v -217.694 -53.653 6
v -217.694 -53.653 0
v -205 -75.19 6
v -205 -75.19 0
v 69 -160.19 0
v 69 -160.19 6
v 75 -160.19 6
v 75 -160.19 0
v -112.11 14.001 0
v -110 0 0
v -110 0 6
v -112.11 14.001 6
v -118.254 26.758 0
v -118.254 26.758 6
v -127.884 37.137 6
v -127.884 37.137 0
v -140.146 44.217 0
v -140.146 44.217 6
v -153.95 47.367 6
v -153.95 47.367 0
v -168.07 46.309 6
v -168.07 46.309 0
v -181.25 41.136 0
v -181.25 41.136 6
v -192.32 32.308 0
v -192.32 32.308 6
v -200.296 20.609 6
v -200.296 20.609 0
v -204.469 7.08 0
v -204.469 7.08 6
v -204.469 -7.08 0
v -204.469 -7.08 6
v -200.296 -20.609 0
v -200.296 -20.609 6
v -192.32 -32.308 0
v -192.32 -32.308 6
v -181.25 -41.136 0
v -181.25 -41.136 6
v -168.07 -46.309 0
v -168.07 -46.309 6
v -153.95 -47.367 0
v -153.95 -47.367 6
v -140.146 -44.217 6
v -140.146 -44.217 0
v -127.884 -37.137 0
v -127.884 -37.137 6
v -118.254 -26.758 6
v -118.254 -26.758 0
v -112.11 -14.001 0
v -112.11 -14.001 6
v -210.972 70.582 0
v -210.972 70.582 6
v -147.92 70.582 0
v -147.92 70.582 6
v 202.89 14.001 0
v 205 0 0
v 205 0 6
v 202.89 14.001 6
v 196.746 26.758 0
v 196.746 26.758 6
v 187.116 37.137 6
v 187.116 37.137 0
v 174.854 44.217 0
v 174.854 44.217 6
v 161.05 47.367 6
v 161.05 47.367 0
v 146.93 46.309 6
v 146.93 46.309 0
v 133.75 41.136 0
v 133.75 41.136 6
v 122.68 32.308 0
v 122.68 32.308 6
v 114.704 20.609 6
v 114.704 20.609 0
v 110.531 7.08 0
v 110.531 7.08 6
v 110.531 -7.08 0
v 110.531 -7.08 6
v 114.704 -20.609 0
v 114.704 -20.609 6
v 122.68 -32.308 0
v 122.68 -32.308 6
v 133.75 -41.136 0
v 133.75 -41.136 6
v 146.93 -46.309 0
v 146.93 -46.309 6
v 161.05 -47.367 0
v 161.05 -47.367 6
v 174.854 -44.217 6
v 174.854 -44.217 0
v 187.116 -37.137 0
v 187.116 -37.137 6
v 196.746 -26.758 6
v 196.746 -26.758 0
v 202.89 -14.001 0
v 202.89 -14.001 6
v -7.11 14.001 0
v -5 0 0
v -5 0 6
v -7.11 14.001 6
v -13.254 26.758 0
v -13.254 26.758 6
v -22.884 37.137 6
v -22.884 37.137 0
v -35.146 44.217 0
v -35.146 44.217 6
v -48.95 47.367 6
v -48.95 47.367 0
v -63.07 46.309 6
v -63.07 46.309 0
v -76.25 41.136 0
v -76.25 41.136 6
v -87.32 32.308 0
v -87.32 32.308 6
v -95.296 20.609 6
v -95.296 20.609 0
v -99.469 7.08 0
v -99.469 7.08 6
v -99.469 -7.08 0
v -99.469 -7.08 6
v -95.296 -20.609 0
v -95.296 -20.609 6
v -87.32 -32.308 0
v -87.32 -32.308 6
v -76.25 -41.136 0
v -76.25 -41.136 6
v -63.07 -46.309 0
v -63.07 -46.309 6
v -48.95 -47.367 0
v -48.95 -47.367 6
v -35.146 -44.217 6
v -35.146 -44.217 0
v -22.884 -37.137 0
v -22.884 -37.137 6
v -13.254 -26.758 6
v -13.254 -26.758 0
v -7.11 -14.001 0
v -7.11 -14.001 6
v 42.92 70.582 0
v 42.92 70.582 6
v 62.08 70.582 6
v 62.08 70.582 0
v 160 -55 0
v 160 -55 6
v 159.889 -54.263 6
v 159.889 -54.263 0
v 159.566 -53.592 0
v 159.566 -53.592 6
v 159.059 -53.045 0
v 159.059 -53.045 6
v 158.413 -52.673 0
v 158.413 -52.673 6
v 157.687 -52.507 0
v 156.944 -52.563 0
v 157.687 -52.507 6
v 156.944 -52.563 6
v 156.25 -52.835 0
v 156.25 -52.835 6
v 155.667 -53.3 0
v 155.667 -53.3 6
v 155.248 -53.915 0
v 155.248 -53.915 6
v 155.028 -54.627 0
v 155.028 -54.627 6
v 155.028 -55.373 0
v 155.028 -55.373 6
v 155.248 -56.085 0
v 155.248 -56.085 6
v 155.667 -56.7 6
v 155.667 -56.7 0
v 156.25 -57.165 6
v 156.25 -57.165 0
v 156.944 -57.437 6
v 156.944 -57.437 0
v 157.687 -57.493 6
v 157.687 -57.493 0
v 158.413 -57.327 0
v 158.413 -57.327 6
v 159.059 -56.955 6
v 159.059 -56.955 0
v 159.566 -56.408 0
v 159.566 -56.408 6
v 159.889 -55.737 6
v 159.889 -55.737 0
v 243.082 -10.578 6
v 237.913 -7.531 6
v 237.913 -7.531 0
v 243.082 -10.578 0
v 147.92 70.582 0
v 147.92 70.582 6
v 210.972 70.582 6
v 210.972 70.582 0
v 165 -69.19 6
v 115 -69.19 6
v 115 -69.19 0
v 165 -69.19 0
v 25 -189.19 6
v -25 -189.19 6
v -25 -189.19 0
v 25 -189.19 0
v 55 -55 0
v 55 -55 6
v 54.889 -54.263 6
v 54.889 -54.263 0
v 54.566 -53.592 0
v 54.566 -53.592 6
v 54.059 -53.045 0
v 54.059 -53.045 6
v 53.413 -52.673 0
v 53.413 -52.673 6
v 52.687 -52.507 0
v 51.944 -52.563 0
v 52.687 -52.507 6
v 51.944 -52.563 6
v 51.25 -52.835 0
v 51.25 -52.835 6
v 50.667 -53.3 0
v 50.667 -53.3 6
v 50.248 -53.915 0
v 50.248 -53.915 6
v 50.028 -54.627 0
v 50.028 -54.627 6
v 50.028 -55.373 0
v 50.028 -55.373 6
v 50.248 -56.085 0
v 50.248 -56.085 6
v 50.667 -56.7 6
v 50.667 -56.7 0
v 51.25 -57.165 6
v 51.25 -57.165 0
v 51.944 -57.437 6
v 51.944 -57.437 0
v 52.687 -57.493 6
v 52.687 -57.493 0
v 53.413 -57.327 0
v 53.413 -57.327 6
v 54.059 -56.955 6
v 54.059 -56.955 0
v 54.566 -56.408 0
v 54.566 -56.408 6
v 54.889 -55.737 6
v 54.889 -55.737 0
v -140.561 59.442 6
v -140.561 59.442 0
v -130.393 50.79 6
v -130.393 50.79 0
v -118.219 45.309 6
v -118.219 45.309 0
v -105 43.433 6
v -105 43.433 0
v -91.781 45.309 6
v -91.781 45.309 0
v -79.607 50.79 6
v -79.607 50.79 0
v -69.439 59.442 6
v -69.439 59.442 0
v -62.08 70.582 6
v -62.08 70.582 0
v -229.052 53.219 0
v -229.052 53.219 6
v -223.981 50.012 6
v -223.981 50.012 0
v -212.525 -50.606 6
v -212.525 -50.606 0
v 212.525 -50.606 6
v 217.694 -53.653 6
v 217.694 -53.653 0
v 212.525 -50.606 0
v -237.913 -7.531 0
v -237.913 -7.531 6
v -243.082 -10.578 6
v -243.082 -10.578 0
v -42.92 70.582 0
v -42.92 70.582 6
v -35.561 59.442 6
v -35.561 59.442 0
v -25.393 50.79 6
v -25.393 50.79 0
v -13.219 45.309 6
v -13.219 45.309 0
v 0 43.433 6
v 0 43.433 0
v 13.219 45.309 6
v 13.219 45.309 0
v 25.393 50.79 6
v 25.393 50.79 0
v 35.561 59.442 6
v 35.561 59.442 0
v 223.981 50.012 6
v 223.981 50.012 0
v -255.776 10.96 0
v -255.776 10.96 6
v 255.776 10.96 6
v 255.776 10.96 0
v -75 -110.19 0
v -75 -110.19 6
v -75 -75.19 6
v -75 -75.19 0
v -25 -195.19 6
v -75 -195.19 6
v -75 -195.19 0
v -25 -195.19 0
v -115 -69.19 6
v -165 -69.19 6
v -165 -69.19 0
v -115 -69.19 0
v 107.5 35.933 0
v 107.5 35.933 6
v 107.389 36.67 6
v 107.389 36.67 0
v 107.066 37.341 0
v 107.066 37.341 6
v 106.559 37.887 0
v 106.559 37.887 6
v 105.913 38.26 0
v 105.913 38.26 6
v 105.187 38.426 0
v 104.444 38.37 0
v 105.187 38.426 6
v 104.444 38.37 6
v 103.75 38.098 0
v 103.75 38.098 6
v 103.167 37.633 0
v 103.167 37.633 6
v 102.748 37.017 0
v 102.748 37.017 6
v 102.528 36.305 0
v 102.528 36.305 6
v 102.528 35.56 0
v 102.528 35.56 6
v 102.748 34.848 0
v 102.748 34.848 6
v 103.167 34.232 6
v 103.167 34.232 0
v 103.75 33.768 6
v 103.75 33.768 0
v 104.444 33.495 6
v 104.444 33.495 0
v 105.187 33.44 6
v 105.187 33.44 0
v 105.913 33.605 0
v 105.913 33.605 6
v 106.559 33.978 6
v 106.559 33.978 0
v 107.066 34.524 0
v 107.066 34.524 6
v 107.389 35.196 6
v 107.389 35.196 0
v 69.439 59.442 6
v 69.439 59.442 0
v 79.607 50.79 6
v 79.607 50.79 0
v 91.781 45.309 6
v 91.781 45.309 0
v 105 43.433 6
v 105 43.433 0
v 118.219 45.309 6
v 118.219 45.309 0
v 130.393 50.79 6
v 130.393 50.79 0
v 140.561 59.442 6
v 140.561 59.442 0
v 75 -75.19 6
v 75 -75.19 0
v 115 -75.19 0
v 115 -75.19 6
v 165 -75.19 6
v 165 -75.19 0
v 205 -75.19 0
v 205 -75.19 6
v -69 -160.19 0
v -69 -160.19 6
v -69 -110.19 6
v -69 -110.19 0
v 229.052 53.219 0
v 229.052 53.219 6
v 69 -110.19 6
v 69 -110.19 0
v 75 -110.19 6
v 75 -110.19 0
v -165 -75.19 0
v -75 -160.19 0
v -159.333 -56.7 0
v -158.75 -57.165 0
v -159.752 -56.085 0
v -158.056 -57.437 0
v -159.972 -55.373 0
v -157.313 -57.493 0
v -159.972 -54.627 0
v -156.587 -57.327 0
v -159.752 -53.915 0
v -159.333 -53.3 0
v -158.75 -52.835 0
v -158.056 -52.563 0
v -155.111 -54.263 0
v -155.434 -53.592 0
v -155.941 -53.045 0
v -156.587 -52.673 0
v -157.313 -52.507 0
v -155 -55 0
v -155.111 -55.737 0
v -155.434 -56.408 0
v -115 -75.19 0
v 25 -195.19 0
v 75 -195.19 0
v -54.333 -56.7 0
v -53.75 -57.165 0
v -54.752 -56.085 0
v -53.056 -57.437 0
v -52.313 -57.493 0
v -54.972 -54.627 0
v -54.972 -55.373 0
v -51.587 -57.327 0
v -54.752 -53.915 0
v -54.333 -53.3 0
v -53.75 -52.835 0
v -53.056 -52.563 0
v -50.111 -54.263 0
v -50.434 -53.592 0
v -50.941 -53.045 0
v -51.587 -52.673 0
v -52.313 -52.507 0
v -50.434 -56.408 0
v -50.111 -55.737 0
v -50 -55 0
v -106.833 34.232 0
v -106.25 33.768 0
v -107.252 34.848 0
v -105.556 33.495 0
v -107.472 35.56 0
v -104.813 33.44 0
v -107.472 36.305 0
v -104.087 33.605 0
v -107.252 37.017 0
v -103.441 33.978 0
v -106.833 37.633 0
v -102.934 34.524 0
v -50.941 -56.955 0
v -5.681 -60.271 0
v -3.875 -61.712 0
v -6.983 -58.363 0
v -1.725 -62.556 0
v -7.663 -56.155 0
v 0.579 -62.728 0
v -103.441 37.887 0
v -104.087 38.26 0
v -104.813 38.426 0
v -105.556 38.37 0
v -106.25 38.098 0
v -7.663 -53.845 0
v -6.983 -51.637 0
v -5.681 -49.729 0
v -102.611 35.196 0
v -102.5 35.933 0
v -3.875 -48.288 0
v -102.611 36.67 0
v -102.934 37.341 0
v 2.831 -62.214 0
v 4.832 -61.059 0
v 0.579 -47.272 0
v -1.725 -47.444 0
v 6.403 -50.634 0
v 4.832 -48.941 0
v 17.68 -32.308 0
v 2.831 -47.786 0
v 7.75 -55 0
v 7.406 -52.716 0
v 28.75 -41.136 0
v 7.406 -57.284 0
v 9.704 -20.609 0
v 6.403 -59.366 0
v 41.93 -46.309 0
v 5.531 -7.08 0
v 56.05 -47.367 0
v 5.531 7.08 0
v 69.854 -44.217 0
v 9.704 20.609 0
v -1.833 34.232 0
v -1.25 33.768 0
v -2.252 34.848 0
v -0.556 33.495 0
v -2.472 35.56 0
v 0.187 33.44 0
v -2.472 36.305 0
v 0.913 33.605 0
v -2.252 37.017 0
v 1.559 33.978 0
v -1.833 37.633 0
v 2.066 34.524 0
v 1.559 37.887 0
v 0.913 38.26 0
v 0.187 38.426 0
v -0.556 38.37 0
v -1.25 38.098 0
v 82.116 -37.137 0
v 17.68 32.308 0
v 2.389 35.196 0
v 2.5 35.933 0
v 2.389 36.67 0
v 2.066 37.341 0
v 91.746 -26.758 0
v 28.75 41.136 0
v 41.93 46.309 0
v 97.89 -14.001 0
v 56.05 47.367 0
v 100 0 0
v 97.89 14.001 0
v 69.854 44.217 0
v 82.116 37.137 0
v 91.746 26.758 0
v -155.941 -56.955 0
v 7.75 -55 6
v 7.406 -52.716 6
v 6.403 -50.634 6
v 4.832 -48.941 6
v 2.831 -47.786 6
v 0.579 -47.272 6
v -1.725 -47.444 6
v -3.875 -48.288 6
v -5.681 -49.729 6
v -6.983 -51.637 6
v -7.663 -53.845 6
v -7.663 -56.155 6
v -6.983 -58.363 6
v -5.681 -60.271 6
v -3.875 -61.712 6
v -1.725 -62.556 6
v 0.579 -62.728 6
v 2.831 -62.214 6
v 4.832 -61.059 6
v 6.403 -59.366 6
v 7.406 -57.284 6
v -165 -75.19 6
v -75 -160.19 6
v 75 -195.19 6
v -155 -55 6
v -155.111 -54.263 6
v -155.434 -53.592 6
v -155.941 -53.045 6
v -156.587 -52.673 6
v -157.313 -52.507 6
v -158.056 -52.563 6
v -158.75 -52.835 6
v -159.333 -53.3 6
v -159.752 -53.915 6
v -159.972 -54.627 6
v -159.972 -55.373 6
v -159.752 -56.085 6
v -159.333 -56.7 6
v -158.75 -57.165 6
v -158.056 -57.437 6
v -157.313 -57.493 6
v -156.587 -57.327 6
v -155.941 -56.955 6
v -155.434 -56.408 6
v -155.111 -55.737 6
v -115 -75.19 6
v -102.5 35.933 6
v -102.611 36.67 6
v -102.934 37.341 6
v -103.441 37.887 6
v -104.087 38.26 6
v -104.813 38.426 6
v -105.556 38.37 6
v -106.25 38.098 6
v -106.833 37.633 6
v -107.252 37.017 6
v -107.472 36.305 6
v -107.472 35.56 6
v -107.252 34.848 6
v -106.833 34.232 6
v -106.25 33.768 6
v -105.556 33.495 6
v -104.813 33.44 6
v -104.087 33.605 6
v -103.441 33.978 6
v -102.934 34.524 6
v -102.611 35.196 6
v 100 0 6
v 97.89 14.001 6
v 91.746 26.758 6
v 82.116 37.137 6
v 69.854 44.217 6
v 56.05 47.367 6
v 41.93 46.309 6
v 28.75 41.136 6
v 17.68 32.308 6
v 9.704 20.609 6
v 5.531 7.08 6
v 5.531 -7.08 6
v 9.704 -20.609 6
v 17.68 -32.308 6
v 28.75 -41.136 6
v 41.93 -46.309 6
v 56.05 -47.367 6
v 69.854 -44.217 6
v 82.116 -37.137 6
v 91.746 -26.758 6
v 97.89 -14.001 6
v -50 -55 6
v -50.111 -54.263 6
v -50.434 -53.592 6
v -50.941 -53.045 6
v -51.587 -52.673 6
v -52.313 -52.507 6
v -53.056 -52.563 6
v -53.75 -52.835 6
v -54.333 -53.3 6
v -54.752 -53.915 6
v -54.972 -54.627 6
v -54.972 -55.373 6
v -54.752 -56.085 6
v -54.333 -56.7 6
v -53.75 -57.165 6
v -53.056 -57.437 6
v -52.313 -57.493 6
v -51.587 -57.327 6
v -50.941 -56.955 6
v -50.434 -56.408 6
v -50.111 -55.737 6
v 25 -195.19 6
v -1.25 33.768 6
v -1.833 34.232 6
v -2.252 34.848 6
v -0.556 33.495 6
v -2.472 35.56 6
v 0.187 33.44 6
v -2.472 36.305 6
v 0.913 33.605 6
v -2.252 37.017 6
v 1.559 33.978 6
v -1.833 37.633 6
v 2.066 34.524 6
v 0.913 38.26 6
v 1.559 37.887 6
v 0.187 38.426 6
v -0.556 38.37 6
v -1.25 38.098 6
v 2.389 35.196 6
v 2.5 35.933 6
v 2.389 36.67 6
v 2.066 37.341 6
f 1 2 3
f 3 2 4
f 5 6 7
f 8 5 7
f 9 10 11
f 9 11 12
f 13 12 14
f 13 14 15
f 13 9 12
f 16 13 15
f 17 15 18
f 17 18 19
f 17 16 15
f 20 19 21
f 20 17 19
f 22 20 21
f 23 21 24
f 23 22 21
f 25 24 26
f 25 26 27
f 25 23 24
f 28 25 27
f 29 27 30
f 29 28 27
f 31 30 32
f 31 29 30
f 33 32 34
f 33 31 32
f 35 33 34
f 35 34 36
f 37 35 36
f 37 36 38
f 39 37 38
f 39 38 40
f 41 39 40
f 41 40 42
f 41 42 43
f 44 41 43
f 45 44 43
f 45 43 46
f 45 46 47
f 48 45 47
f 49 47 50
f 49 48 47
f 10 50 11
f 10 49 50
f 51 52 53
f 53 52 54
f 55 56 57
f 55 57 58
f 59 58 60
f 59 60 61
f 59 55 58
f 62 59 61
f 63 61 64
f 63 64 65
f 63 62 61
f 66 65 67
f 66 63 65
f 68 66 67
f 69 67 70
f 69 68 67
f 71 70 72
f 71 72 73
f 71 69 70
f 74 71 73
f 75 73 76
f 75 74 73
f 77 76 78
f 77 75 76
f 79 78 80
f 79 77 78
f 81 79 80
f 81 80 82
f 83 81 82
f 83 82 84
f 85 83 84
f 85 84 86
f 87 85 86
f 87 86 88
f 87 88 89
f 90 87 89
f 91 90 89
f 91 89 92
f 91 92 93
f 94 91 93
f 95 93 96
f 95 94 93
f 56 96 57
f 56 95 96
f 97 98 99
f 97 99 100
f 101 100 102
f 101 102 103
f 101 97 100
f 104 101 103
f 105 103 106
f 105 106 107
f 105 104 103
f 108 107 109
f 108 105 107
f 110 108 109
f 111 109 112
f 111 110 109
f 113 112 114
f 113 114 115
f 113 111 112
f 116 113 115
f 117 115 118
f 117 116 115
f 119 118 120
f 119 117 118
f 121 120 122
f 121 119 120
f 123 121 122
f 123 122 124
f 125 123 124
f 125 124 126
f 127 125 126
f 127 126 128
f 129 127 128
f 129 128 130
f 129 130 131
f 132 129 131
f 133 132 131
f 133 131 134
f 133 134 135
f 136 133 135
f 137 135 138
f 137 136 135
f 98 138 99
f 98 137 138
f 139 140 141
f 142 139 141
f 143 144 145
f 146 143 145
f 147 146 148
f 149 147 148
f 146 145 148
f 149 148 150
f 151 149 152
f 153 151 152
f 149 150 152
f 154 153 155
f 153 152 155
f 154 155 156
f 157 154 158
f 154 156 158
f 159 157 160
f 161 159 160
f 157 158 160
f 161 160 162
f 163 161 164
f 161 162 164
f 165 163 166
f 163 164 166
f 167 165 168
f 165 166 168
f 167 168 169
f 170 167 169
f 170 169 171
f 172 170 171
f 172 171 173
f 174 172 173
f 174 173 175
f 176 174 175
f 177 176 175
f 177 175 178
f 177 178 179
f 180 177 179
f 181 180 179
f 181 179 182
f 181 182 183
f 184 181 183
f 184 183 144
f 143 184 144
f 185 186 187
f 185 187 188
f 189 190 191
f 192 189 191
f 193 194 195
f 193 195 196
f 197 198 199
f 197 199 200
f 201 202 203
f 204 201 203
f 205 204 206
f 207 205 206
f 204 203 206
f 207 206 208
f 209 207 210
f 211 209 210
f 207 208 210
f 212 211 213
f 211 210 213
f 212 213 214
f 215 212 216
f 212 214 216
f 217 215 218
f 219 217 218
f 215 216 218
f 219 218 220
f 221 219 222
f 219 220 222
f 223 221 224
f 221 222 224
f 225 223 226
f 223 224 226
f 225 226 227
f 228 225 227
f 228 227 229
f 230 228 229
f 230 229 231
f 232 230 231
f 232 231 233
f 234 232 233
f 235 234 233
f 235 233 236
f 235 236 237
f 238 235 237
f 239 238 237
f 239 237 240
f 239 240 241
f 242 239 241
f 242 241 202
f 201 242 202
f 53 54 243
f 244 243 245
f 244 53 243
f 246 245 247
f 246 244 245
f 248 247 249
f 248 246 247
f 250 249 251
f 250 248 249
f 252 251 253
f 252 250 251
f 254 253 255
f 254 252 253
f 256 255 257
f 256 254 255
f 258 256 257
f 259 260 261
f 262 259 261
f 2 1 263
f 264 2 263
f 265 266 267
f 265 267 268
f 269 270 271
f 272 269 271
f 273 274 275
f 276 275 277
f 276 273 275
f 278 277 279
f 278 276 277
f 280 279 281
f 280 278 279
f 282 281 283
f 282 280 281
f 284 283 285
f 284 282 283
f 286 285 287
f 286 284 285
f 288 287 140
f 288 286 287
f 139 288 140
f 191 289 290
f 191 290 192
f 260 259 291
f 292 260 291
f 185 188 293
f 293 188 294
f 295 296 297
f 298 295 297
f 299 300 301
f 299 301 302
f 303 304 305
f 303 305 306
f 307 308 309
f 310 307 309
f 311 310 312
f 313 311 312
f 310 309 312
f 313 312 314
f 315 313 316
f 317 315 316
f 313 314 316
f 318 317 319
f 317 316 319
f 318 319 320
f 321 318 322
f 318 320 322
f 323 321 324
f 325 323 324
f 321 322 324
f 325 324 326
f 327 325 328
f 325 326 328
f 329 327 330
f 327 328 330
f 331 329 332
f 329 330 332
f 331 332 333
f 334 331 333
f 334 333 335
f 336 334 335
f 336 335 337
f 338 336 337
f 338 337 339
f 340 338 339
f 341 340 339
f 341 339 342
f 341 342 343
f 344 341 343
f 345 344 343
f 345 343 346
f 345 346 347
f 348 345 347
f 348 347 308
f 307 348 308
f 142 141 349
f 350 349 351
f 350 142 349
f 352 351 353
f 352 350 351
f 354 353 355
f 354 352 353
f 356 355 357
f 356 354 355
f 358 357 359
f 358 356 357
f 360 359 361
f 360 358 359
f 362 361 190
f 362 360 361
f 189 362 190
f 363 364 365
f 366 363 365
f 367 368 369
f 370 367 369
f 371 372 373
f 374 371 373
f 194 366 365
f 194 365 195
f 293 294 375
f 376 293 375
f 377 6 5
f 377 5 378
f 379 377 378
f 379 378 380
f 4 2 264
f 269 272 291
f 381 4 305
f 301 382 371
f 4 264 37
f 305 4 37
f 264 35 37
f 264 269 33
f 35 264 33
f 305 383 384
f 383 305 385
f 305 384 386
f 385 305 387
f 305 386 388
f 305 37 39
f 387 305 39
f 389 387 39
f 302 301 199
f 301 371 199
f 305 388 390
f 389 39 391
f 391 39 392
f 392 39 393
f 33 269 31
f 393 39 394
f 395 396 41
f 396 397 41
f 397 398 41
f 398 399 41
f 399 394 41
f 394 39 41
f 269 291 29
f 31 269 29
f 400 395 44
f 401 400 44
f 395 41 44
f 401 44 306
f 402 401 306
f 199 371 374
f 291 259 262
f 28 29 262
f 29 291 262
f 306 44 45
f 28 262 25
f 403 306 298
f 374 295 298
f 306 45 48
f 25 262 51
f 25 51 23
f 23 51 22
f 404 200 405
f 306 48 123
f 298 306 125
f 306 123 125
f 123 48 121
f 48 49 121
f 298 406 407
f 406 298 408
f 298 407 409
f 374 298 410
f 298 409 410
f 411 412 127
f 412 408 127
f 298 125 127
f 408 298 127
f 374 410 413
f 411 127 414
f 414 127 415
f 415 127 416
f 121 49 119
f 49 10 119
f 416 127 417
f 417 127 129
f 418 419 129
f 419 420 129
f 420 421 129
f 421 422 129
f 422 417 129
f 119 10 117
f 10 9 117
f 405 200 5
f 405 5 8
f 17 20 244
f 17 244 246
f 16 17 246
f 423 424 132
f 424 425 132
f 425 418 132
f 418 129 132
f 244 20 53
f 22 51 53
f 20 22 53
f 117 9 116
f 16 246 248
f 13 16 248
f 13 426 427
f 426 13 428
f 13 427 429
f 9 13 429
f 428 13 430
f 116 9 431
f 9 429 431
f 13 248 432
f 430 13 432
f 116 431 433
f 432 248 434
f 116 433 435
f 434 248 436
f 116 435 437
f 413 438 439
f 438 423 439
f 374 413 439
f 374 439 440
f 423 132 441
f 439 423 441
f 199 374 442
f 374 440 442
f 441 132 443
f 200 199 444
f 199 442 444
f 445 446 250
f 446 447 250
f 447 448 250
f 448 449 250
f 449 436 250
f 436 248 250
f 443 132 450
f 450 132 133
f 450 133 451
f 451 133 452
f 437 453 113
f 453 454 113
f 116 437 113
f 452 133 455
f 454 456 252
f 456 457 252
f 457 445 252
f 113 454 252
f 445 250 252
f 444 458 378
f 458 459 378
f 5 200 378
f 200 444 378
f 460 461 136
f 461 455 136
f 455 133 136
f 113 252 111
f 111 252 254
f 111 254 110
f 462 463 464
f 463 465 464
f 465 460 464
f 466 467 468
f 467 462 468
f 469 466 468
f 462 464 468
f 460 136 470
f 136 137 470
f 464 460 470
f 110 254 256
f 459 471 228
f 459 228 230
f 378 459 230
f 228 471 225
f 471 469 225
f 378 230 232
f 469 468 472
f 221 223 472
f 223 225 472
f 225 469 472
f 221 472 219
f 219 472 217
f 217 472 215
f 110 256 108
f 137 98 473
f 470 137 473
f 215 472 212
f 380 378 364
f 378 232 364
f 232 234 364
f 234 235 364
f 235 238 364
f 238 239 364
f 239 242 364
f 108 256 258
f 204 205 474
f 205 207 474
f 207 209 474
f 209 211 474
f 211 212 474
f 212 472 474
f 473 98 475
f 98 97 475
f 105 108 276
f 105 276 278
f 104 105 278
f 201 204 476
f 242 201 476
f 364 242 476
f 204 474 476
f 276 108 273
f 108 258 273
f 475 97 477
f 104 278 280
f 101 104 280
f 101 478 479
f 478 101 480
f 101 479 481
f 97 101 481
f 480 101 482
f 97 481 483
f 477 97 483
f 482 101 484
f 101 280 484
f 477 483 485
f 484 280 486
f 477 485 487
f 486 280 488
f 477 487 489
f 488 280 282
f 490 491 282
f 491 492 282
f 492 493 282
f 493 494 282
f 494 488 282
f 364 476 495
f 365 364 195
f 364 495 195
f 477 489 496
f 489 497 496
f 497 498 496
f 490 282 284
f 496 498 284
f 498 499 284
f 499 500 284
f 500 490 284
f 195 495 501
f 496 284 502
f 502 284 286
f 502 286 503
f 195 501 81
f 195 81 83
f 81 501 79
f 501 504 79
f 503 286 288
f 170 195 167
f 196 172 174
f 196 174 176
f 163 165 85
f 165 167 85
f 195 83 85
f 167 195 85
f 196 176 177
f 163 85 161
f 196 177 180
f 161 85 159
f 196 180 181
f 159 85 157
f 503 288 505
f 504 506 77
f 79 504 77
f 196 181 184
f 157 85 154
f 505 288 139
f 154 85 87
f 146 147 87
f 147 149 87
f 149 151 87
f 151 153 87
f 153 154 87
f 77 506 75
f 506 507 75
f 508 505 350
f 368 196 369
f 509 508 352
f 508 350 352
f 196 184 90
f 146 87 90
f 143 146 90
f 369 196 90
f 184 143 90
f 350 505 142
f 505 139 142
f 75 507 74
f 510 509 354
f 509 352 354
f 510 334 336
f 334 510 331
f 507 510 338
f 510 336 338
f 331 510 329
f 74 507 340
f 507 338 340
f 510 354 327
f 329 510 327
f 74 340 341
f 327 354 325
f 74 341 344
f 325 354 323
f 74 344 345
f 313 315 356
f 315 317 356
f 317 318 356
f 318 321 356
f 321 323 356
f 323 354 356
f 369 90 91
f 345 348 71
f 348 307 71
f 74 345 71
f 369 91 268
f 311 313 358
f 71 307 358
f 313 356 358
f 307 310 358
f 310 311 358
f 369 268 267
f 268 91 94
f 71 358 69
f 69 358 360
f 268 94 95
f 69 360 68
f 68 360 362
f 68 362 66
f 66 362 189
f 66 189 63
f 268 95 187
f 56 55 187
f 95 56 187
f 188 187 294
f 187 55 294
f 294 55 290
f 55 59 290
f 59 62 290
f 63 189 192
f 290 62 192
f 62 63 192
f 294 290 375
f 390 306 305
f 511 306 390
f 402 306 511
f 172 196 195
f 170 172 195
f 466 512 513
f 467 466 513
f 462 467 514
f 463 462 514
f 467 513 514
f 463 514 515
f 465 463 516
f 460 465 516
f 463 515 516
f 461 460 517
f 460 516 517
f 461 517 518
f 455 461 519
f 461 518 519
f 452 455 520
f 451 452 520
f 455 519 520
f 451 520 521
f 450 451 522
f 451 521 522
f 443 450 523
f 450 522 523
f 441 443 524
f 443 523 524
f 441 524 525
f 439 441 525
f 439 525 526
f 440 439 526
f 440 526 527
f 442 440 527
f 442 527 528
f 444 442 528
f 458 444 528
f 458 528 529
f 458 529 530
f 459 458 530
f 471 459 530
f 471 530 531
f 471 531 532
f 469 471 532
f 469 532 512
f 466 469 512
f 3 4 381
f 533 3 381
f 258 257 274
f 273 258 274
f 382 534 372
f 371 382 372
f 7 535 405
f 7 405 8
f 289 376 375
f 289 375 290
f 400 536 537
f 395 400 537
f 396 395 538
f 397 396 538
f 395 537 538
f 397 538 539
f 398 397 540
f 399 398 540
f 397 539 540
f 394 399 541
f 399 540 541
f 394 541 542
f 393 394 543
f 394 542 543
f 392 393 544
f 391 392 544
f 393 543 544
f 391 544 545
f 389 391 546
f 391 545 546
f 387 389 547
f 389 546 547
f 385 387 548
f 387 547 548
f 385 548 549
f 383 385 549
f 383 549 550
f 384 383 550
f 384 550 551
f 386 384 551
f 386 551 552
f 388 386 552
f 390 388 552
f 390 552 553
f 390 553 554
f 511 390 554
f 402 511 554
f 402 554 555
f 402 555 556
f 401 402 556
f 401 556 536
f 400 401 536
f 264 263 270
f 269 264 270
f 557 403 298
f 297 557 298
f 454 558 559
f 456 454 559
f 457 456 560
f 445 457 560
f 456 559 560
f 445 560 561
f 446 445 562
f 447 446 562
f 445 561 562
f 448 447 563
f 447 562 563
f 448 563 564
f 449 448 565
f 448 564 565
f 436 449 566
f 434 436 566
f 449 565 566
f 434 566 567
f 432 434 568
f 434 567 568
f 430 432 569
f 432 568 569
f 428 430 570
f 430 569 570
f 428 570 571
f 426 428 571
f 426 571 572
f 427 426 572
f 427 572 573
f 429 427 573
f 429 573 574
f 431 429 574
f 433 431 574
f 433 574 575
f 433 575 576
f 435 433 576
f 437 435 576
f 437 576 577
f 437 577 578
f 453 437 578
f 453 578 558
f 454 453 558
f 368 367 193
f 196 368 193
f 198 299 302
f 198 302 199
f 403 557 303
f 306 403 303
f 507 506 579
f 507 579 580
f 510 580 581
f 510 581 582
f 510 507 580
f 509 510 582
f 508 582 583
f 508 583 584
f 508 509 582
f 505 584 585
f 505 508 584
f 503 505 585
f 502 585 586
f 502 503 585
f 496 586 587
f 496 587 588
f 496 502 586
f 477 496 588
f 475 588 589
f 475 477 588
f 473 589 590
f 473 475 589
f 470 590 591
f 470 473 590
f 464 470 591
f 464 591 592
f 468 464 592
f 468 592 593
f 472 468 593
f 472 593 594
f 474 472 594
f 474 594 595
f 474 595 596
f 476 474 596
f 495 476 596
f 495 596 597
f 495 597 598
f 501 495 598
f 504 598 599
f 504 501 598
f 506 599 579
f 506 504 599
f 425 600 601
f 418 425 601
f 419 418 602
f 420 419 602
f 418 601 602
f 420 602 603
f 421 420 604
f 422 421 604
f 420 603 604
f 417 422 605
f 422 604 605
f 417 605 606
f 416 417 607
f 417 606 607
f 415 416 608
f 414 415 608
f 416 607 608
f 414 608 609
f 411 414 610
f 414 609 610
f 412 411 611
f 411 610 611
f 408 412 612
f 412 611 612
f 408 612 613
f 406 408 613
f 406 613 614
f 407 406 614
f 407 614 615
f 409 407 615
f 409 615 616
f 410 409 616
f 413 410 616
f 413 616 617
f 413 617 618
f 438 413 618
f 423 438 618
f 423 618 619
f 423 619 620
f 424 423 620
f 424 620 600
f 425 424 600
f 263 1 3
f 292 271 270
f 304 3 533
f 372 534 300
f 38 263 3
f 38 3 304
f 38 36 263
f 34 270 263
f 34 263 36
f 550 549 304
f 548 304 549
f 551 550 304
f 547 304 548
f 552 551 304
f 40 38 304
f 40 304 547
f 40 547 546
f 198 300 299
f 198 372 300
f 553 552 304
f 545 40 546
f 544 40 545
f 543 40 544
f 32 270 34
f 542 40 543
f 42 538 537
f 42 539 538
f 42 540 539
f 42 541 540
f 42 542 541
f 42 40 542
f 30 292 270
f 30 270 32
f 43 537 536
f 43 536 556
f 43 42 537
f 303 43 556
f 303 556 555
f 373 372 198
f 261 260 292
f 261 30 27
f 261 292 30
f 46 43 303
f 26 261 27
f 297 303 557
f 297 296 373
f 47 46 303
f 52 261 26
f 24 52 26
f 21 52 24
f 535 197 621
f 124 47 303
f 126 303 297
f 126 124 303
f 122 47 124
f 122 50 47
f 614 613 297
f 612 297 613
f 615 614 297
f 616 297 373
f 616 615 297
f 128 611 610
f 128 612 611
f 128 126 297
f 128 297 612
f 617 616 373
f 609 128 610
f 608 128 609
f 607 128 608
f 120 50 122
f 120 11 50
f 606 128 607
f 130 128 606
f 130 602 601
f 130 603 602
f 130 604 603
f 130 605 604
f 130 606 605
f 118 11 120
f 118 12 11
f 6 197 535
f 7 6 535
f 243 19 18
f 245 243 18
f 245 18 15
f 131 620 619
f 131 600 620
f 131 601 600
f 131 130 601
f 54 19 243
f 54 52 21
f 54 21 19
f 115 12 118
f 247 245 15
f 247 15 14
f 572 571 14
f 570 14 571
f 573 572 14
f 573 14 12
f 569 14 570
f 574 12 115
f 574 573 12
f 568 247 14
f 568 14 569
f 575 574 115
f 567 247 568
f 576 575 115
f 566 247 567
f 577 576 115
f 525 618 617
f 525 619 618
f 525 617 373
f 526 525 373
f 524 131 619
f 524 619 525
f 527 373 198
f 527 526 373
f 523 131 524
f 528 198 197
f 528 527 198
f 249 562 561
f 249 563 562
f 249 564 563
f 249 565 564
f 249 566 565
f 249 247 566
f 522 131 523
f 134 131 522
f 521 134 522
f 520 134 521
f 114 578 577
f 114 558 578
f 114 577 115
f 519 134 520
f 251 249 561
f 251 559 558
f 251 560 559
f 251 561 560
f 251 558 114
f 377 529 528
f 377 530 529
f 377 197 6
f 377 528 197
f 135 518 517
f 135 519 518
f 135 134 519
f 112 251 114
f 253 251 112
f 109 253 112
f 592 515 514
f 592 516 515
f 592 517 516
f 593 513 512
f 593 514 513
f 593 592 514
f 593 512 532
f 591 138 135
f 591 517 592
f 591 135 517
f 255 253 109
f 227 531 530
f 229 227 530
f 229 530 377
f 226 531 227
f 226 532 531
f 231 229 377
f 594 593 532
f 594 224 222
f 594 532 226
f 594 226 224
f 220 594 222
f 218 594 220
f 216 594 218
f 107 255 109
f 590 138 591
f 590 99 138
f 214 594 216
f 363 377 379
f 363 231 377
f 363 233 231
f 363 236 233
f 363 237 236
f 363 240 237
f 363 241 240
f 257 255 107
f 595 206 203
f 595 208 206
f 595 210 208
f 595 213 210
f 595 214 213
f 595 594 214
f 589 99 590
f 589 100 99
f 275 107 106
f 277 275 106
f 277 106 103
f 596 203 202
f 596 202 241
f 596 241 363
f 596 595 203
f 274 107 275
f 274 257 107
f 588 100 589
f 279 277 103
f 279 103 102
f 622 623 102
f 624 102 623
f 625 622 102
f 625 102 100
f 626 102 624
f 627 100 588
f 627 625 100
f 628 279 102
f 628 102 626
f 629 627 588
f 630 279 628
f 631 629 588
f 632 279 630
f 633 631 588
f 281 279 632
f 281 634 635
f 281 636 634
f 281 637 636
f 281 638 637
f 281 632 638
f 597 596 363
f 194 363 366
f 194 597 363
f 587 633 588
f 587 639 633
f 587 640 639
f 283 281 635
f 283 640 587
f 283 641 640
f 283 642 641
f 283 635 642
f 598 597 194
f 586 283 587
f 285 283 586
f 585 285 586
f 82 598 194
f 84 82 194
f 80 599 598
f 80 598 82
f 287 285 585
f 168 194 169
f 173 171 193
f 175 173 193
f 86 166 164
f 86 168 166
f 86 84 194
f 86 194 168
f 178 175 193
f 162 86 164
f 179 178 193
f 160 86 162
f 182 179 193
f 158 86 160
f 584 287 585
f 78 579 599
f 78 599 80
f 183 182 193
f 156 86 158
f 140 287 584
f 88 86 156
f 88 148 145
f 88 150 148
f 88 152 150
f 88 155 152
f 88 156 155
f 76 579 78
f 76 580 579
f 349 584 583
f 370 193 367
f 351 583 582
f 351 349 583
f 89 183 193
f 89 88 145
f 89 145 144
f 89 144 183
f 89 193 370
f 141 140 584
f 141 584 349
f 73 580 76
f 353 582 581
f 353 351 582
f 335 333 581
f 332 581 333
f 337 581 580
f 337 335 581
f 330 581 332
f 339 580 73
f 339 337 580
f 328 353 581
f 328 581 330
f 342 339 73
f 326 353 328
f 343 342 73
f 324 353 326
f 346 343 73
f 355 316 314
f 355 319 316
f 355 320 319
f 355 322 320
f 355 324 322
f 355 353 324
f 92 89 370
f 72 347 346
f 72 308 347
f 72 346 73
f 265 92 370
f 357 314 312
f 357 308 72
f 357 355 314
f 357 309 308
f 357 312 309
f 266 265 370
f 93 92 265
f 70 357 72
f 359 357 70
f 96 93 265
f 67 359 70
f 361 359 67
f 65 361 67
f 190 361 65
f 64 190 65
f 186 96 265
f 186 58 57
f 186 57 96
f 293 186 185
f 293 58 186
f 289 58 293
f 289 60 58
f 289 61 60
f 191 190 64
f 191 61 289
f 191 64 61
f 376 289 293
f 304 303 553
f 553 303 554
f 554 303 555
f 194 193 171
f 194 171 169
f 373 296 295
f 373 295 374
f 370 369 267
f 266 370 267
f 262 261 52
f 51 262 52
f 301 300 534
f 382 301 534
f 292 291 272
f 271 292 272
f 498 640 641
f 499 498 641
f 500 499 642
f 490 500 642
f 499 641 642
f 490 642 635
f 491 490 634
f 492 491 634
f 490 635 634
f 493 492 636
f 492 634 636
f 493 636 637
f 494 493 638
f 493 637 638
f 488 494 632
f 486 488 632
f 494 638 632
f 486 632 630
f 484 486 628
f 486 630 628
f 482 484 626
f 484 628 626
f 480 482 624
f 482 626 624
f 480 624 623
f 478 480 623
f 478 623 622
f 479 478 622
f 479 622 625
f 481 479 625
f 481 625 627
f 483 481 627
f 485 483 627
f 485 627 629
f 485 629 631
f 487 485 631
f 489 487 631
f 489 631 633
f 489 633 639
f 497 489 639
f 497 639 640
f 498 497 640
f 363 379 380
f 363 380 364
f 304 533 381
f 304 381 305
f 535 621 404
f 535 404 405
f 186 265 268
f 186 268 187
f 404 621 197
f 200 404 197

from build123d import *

# Parameters (mm, degrees)
ESQUISSE1_R             = 47.5
BOSS_EXTRU_1_DEPTH      = 6
ESQUISSE9_W             = 150
ESQUISSE9_H             = 120
BOSS_EXTRU_2_DEPTH      = 6
ESQUISSE10_W            = 6
ESQUISSE10_H            = 50
ESQUISSE10_W_2          = 50
ESQUISSE10_H_2          = 6
ENL_V_MAT_EXTRU_1_DEPTH = 10
ESQUISSE12_W            = 675.538278175
ESQUISSE12_H            = 265.771999275
ENL_V_MAT_EXTRU_3_DEPTH = 10
ESQUISSE13_R            = 2.5
ENL_V_MAT_EXTRU_4_DEPTH = 10
ESQUISSE14_R            = 7.75
ENL_V_MAT_EXTRU_5_DEPTH = 10


with BuildPart() as part:
    # Esquisse1 → Boss.-Extru.1 (new body)
    with BuildSketch(Plane.XY):
        Polygon((-255.775862069, 10.959681362), (-205, -75.190256718), (205, -75.190256718), (255.775862069, 10.959681362), (50, 336.353741833), (-50, 336.353741833), align=None)
        with Locations((-157.5, 0)):
            Circle(ESQUISSE1_R, mode=Mode.SUBTRACT)
        with Locations((-52.5, 0)):
            Circle(ESQUISSE1_R, mode=Mode.SUBTRACT)
        with Locations((52.5, 0)):
            Circle(ESQUISSE1_R, mode=Mode.SUBTRACT)
        with Locations((157.5, 0)):
            Circle(ESQUISSE1_R, mode=Mode.SUBTRACT)
        with Locations((-105, 90.932667397)):
            Circle(ESQUISSE1_R, mode=Mode.SUBTRACT)
        with Locations((0, 90.932667397)):
            Circle(ESQUISSE1_R, mode=Mode.SUBTRACT)
        with Locations((105, 90.932667397)):
            Circle(ESQUISSE1_R, mode=Mode.SUBTRACT)
        with Locations((-52.5, 181.865334795)):
            Circle(ESQUISSE1_R, mode=Mode.SUBTRACT)
        with Locations((52.5, 181.865334795)):
            Circle(ESQUISSE1_R, mode=Mode.SUBTRACT)
        with Locations((0, 272.798002192)):
            Circle(ESQUISSE1_R, mode=Mode.SUBTRACT)
    extrude(amount=BOSS_EXTRU_1_DEPTH)

    # Esquisse9 → Boss.-Extru.2 (add)
    with BuildSketch(Plane.XY.offset(6)):
        with Locations((0, -135.190256718)):
            Rectangle(ESQUISSE9_W, ESQUISSE9_H)
    extrude(amount=-BOSS_EXTRU_2_DEPTH)

    # Esquisse10 → Enlèv. mat.-Extru.1 (cut)
    with BuildSketch(Plane.XY.offset(6)):
        with Locations((-72, -135.190256718)):
            Rectangle(ESQUISSE10_W, ESQUISSE10_H)
        with Locations((0, -192.190256718)):
            Rectangle(ESQUISSE10_W_2, ESQUISSE10_H_2)
        with Locations((-140, -72.190256718)):
            Rectangle(ESQUISSE10_W_2, ESQUISSE10_H_2)
        Polygon((-217.693965517, -53.652772198), (-212.524969232, -50.606220473), (-237.912900267, -7.531251434), (-243.081896552, -10.577803158), align=None)
        Polygon((-229.051724138, 53.218650255), (-223.980647871, 50.011753703), (-170.532372009, 134.529691487), (-175.603448276, 137.736588039), align=None)
        Polygon((-130.172413793, 209.576835156), (-125.101337526, 206.369938604), (-71.653061664, 290.887876389), (-76.724137931, 294.094772941), align=None)
        with Locations((0, 333.353741833)):
            Rectangle(ESQUISSE10_W_2, ESQUISSE10_H_2)
        Polygon((71.653061664, 290.887876389), (76.724137931, 294.094772941), (130.172413793, 209.576835156), (125.101337526, 206.369938604), align=None)
        Polygon((170.532372009, 134.529691487), (175.603448276, 137.736588039), (229.051724138, 53.218650255), (223.980647871, 50.011753703), align=None)
        Polygon((237.912900267, -7.531251434), (243.081896552, -10.577803158), (217.693965517, -53.652772198), (212.524969232, -50.606220473), align=None)
        with Locations((140, -72.190256718)):
            Rectangle(ESQUISSE10_W_2, ESQUISSE10_H_2)
        with Locations((72, -135.190256718)):
            Rectangle(ESQUISSE10_W, ESQUISSE10_H)
    extrude(amount=-ENL_V_MAT_EXTRU_1_DEPTH, mode=Mode.SUBTRACT)

    # Esquisse12 → Enlèv. mat.-Extru.3 (cut)
    with BuildSketch(Plane.XY.offset(6)):
        with Locations((-8.823645222, 203.467742196)):
            Rectangle(ESQUISSE12_W, ESQUISSE12_H)
    extrude(amount=-ENL_V_MAT_EXTRU_3_DEPTH, mode=Mode.SUBTRACT)

    # Esquisse13 → Enlèv. mat.-Extru.4 (cut)
    with BuildSketch(Plane.XY.offset(6)):
        with Locations((-157.5, -55)):
            Circle(ESQUISSE13_R)
        with Locations((-52.5, -55)):
            Circle(ESQUISSE13_R)
        with Locations((52.5, -55)):
            Circle(ESQUISSE13_R)
        with Locations((157.5, -55)):
            Circle(ESQUISSE13_R)
        with Locations((-105, 35.932667397)):
            Circle(ESQUISSE13_R)
        with Locations((0, 35.932667397)):
            Circle(ESQUISSE13_R)
        with Locations((105, 35.932667397)):
            Circle(ESQUISSE13_R)
    extrude(amount=-ENL_V_MAT_EXTRU_4_DEPTH, mode=Mode.SUBTRACT)

    # Esquisse14 → Enlèv. mat.-Extru.5 (cut)
    with BuildSketch(Plane.XY.offset(6)):
        with Locations((0, -55)):
            Circle(ESQUISSE14_R)
    extrude(amount=-ENL_V_MAT_EXTRU_5_DEPTH, mode=Mode.SUBTRACT)


solid = part.part
